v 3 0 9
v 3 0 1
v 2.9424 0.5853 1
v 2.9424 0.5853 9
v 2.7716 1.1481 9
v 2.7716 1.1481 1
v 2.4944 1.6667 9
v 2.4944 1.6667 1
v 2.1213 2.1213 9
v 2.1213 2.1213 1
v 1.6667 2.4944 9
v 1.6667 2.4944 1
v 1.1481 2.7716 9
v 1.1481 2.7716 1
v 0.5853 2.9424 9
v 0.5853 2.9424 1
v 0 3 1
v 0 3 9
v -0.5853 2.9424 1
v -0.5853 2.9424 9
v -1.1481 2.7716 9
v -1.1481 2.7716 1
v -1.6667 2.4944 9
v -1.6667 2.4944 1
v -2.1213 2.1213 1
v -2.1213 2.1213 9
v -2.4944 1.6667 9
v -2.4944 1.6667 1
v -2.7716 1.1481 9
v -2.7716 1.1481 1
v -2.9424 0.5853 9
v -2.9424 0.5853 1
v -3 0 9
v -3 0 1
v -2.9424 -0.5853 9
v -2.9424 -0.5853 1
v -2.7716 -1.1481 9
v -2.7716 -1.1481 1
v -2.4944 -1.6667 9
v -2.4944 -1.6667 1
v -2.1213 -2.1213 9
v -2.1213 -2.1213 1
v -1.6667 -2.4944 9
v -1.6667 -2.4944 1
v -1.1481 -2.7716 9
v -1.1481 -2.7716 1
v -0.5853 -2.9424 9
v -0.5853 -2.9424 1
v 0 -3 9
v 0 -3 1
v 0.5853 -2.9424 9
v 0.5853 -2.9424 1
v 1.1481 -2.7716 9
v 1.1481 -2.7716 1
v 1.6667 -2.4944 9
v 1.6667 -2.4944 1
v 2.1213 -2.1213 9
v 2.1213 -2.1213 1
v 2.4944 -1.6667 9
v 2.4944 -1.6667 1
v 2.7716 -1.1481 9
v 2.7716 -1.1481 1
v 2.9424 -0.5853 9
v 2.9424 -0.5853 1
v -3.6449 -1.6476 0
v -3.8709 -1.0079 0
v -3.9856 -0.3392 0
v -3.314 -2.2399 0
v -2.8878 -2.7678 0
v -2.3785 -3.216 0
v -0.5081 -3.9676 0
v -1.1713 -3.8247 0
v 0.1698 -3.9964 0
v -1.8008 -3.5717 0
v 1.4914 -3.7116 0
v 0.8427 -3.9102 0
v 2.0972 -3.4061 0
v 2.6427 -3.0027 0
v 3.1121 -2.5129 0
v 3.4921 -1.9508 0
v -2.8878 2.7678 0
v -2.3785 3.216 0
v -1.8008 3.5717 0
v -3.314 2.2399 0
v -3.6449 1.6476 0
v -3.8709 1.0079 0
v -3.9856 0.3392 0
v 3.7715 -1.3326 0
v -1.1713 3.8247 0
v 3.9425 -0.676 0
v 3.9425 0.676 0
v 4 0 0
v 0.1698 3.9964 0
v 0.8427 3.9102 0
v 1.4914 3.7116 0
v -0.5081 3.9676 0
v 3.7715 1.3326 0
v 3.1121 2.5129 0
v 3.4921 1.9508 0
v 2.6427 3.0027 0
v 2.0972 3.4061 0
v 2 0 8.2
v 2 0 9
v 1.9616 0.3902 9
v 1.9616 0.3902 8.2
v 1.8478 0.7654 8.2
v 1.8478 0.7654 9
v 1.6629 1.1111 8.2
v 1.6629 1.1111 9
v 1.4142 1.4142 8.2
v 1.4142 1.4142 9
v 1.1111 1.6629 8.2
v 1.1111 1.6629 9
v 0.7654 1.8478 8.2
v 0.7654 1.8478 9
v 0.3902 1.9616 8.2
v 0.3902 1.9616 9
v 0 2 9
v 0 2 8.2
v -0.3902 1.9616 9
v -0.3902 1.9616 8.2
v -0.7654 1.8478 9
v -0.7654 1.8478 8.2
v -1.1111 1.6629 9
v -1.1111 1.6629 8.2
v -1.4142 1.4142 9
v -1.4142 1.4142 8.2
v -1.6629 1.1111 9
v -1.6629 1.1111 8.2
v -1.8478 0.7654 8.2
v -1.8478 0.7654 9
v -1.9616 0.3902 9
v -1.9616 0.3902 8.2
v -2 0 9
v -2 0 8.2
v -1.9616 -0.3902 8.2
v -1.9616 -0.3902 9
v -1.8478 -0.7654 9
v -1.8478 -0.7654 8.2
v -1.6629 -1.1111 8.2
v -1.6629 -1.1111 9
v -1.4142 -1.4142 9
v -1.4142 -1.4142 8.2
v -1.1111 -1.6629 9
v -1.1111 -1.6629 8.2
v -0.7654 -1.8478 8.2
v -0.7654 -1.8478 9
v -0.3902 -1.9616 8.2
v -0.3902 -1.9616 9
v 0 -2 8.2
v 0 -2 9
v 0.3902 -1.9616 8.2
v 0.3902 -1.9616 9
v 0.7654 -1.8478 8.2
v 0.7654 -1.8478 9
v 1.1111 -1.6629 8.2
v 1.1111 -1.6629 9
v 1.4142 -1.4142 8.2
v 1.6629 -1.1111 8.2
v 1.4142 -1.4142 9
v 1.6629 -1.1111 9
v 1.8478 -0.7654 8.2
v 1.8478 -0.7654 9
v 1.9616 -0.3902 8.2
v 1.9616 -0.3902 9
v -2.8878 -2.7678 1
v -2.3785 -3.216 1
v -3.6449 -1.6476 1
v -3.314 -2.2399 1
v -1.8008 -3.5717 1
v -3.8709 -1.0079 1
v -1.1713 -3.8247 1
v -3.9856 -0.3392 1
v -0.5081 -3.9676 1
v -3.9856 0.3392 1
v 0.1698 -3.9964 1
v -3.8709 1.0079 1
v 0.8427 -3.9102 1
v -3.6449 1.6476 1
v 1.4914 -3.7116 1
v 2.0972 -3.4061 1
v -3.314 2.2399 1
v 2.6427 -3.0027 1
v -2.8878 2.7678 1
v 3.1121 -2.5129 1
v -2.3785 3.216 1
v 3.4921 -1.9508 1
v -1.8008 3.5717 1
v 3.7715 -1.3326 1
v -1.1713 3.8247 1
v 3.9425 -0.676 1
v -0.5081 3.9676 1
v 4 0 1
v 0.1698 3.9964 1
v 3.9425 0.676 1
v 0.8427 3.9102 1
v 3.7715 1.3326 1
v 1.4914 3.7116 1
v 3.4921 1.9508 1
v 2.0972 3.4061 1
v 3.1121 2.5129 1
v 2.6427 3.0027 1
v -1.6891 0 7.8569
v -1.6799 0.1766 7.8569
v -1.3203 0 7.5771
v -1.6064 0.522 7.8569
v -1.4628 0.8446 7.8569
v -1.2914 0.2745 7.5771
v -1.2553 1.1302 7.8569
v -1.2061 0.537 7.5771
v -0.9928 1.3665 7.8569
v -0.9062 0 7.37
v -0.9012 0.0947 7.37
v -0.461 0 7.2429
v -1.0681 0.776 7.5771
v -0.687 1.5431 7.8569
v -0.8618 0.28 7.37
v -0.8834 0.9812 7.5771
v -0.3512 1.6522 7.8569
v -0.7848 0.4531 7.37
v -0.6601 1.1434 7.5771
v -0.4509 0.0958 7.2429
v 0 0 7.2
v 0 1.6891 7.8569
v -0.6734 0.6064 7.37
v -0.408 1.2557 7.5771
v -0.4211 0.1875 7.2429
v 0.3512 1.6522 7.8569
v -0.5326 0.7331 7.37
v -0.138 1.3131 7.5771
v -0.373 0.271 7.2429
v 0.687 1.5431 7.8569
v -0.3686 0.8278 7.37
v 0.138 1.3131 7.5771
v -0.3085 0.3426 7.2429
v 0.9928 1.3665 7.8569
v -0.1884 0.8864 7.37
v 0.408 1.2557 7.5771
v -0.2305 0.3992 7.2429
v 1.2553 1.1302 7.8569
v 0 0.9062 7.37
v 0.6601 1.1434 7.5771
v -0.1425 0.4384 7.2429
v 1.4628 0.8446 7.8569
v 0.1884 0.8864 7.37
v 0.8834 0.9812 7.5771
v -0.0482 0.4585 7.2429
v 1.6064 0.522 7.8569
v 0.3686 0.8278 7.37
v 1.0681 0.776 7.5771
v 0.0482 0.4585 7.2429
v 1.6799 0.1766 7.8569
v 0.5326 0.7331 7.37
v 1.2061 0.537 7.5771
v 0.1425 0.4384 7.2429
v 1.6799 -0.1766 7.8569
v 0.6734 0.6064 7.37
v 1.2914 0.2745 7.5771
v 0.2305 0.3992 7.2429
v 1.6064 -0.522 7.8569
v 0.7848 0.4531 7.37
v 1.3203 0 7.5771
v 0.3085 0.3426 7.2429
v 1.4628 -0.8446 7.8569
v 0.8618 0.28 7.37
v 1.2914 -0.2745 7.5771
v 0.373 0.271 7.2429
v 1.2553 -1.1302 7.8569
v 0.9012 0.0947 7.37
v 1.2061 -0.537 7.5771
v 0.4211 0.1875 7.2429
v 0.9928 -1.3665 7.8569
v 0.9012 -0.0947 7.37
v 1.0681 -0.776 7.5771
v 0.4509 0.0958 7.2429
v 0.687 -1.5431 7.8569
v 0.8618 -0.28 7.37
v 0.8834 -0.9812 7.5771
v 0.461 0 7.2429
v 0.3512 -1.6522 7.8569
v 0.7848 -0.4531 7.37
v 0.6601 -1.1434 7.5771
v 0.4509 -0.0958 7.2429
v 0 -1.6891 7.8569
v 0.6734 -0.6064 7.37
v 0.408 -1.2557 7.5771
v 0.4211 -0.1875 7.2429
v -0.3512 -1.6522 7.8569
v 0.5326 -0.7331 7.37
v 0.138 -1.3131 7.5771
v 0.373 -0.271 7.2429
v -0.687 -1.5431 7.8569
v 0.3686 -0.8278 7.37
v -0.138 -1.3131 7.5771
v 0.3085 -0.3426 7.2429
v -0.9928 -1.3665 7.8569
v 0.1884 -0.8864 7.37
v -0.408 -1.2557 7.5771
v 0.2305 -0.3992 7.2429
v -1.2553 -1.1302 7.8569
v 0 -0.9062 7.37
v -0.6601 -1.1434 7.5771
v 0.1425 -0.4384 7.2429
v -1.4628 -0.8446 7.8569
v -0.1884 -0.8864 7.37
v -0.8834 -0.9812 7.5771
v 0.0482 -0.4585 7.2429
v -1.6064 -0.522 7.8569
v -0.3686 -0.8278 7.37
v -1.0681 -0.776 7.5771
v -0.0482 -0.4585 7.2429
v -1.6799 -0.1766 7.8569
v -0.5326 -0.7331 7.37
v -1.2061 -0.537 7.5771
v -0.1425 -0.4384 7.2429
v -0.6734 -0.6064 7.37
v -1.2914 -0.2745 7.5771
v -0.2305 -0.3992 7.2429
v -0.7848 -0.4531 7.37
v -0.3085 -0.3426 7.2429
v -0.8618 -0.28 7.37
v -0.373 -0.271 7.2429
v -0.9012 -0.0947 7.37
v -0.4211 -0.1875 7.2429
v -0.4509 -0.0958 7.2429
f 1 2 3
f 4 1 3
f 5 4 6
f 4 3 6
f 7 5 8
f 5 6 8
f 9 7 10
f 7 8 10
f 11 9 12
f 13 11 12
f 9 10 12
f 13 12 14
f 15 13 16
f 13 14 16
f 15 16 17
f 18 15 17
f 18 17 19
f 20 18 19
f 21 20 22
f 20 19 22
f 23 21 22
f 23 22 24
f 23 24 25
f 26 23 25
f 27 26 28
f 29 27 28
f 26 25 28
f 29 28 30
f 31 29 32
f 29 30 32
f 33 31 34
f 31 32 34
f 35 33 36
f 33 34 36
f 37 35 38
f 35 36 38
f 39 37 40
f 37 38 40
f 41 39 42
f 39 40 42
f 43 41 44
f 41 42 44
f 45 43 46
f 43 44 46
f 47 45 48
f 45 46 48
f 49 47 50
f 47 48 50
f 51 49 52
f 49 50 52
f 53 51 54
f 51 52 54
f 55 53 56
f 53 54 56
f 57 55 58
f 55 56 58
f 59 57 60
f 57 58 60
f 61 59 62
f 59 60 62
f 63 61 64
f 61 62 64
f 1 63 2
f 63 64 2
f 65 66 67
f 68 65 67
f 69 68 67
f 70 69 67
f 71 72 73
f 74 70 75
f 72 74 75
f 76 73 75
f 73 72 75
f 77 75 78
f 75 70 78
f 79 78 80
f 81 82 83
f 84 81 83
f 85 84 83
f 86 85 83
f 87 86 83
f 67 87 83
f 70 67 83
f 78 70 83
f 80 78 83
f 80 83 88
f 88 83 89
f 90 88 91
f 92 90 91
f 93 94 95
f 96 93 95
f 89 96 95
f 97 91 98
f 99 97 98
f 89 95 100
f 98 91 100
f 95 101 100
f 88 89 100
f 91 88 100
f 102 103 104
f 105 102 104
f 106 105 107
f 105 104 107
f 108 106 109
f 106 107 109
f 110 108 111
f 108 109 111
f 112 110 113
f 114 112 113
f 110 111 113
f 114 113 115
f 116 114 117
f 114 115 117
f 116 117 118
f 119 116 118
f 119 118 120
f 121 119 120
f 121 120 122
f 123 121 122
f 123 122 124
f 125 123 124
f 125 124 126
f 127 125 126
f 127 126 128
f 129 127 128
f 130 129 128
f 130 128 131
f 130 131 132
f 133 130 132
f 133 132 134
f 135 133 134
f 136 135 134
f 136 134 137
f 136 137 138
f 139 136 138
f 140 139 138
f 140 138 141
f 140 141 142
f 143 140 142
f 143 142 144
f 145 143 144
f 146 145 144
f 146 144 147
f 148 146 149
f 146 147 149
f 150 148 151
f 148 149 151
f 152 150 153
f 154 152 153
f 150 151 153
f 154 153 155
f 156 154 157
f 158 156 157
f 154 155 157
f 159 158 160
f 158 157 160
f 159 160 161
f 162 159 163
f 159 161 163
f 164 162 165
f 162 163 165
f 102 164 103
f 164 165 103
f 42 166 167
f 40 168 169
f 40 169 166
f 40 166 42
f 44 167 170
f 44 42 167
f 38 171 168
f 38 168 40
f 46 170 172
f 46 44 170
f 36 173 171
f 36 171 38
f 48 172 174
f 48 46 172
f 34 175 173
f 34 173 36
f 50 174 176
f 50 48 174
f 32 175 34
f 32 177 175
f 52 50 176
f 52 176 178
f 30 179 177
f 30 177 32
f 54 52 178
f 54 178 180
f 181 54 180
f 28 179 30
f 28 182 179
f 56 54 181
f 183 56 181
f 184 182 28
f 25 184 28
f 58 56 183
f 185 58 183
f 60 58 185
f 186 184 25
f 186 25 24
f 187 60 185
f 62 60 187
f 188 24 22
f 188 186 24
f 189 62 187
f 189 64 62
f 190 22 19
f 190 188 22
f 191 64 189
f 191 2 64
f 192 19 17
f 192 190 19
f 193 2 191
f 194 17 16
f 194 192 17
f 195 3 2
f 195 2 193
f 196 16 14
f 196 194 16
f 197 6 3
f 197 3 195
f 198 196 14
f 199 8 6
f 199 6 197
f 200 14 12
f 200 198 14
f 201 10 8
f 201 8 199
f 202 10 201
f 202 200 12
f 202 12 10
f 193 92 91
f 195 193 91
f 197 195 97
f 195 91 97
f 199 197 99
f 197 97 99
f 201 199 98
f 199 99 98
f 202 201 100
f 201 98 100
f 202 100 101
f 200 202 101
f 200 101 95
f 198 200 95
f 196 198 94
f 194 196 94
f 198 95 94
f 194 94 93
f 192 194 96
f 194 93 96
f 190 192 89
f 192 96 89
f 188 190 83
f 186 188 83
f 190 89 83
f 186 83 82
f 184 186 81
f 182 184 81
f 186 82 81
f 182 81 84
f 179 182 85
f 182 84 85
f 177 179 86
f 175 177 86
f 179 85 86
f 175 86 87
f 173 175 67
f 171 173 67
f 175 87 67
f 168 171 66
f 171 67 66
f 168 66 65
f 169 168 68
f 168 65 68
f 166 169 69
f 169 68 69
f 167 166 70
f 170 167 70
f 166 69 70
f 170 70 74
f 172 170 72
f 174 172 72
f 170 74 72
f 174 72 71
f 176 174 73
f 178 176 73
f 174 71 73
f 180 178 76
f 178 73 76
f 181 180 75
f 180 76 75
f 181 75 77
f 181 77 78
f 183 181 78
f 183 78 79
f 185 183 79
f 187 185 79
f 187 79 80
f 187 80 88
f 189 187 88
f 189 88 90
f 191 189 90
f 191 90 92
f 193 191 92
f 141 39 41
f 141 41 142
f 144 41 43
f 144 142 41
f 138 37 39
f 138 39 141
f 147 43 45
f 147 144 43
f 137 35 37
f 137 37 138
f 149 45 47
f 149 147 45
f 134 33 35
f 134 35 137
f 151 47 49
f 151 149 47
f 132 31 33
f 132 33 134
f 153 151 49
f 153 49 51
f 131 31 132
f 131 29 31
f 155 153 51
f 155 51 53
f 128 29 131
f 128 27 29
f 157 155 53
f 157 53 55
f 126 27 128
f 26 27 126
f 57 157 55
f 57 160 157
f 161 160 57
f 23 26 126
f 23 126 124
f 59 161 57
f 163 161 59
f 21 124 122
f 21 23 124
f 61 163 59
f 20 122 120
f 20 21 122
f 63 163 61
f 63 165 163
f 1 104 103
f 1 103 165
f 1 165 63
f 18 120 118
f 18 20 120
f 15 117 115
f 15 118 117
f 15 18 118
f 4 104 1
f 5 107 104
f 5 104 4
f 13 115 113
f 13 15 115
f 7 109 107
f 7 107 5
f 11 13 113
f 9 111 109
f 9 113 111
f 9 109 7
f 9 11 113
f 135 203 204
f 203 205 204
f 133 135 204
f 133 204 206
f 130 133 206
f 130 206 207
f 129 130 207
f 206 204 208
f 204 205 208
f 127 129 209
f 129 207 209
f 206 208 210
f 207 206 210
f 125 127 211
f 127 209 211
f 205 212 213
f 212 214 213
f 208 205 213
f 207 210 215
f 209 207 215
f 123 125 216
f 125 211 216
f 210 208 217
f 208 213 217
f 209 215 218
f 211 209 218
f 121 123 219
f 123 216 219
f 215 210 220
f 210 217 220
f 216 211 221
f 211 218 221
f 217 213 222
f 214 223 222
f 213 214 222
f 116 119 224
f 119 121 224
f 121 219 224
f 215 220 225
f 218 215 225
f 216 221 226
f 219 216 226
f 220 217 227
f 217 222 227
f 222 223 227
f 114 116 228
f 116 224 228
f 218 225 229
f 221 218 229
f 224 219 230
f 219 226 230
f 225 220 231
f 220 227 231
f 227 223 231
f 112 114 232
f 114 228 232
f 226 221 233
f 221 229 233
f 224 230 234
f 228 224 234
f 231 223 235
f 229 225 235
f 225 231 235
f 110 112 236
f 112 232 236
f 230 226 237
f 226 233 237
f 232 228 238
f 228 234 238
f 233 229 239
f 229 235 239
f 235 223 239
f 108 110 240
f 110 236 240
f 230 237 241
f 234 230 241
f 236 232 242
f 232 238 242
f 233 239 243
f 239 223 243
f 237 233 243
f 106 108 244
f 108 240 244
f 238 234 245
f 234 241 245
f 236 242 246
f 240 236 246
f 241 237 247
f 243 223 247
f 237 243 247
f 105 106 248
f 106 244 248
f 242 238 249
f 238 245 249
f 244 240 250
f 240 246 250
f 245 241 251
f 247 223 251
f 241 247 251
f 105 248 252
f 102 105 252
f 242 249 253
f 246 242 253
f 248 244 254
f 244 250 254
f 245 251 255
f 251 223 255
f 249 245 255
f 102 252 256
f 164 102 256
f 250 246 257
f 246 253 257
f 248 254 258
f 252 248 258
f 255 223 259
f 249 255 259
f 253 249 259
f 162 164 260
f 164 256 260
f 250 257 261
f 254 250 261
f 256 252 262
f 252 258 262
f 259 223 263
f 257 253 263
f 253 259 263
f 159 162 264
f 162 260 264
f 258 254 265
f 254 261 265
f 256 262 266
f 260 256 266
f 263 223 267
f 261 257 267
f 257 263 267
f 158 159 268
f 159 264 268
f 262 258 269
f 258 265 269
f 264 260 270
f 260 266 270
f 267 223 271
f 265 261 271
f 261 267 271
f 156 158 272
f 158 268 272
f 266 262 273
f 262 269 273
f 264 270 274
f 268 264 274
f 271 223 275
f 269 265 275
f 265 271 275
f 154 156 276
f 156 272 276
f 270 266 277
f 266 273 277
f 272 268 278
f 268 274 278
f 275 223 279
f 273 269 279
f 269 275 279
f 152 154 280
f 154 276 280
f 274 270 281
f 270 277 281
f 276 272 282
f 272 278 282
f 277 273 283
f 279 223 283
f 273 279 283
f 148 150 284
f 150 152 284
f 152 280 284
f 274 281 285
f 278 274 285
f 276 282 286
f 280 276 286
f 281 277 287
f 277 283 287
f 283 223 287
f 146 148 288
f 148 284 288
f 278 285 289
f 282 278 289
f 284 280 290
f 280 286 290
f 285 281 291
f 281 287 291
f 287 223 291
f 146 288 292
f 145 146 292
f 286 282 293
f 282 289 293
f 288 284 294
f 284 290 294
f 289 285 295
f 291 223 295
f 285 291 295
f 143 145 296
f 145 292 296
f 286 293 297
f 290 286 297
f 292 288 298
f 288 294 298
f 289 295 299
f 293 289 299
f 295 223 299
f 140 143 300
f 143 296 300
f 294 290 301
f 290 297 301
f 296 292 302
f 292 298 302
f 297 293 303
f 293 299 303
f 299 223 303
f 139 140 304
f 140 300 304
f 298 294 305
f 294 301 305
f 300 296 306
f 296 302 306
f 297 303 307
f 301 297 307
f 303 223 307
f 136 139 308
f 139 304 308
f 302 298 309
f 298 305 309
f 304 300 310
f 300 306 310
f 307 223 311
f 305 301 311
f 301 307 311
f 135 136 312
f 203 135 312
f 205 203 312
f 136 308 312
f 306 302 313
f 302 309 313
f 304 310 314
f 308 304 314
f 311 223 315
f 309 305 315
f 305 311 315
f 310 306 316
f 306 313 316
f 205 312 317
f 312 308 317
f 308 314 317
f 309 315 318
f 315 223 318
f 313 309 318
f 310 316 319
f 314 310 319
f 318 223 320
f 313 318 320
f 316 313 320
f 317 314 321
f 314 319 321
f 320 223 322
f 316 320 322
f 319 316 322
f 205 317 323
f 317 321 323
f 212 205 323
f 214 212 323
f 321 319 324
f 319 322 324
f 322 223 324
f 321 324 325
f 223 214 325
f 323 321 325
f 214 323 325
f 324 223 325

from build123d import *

# Parameters (mm, degrees)
SKETCH2_R           = 4
BOSS_EXTRUDE1_DEPTH = 1
SKETCH3_R           = 3
BOSS_EXTRUDE2_DEPTH = 8
SKETCH4_R           = 2
CUT_EXTRUDE4_DEPTH  = 0.8
DOME2_FACE_RADIUS   = 2
DOME2_HEIGHT        = 1


with BuildPart() as part:
    # Sketch2 → Boss-Extrude1 (new body)
    with BuildSketch(Plane.XY):
        Circle(SKETCH2_R)
    extrude(amount=BOSS_EXTRUDE1_DEPTH)

    # Sketch3 → Boss-Extrude2 (add)
    with BuildSketch(Plane.XY.offset(1)):
        Circle(SKETCH3_R)
    extrude(amount=BOSS_EXTRUDE2_DEPTH)

    # Sketch4 → Cut-Extrude4 (cut)
    with BuildSketch(Plane.XY.offset(9)):
        Circle(SKETCH4_R)
    extrude(amount=-CUT_EXTRUDE4_DEPTH, mode=Mode.SUBTRACT)

    # Dome2: a dome of height H over a round flat face of radius A is a cap of a sphere of radius (A * A + H * H) / (2 * H)
    dome2_r = (DOME2_FACE_RADIUS * DOME2_FACE_RADIUS + DOME2_HEIGHT * DOME2_HEIGHT) / (2 * DOME2_HEIGHT)
    dome2_base = Plane((0, 0, 8.2), z_dir=(0, 0, -1))
    with Locations(dome2_base.offset(DOME2_HEIGHT - dome2_r)):
        dome2_ball = Sphere(dome2_r, mode=Mode.PRIVATE)
    add(split(dome2_ball, bisect_by=dome2_base, keep=Keep.TOP, mode=Mode.PRIVATE), mode=Mode.SUBTRACT)


solid = part.part
